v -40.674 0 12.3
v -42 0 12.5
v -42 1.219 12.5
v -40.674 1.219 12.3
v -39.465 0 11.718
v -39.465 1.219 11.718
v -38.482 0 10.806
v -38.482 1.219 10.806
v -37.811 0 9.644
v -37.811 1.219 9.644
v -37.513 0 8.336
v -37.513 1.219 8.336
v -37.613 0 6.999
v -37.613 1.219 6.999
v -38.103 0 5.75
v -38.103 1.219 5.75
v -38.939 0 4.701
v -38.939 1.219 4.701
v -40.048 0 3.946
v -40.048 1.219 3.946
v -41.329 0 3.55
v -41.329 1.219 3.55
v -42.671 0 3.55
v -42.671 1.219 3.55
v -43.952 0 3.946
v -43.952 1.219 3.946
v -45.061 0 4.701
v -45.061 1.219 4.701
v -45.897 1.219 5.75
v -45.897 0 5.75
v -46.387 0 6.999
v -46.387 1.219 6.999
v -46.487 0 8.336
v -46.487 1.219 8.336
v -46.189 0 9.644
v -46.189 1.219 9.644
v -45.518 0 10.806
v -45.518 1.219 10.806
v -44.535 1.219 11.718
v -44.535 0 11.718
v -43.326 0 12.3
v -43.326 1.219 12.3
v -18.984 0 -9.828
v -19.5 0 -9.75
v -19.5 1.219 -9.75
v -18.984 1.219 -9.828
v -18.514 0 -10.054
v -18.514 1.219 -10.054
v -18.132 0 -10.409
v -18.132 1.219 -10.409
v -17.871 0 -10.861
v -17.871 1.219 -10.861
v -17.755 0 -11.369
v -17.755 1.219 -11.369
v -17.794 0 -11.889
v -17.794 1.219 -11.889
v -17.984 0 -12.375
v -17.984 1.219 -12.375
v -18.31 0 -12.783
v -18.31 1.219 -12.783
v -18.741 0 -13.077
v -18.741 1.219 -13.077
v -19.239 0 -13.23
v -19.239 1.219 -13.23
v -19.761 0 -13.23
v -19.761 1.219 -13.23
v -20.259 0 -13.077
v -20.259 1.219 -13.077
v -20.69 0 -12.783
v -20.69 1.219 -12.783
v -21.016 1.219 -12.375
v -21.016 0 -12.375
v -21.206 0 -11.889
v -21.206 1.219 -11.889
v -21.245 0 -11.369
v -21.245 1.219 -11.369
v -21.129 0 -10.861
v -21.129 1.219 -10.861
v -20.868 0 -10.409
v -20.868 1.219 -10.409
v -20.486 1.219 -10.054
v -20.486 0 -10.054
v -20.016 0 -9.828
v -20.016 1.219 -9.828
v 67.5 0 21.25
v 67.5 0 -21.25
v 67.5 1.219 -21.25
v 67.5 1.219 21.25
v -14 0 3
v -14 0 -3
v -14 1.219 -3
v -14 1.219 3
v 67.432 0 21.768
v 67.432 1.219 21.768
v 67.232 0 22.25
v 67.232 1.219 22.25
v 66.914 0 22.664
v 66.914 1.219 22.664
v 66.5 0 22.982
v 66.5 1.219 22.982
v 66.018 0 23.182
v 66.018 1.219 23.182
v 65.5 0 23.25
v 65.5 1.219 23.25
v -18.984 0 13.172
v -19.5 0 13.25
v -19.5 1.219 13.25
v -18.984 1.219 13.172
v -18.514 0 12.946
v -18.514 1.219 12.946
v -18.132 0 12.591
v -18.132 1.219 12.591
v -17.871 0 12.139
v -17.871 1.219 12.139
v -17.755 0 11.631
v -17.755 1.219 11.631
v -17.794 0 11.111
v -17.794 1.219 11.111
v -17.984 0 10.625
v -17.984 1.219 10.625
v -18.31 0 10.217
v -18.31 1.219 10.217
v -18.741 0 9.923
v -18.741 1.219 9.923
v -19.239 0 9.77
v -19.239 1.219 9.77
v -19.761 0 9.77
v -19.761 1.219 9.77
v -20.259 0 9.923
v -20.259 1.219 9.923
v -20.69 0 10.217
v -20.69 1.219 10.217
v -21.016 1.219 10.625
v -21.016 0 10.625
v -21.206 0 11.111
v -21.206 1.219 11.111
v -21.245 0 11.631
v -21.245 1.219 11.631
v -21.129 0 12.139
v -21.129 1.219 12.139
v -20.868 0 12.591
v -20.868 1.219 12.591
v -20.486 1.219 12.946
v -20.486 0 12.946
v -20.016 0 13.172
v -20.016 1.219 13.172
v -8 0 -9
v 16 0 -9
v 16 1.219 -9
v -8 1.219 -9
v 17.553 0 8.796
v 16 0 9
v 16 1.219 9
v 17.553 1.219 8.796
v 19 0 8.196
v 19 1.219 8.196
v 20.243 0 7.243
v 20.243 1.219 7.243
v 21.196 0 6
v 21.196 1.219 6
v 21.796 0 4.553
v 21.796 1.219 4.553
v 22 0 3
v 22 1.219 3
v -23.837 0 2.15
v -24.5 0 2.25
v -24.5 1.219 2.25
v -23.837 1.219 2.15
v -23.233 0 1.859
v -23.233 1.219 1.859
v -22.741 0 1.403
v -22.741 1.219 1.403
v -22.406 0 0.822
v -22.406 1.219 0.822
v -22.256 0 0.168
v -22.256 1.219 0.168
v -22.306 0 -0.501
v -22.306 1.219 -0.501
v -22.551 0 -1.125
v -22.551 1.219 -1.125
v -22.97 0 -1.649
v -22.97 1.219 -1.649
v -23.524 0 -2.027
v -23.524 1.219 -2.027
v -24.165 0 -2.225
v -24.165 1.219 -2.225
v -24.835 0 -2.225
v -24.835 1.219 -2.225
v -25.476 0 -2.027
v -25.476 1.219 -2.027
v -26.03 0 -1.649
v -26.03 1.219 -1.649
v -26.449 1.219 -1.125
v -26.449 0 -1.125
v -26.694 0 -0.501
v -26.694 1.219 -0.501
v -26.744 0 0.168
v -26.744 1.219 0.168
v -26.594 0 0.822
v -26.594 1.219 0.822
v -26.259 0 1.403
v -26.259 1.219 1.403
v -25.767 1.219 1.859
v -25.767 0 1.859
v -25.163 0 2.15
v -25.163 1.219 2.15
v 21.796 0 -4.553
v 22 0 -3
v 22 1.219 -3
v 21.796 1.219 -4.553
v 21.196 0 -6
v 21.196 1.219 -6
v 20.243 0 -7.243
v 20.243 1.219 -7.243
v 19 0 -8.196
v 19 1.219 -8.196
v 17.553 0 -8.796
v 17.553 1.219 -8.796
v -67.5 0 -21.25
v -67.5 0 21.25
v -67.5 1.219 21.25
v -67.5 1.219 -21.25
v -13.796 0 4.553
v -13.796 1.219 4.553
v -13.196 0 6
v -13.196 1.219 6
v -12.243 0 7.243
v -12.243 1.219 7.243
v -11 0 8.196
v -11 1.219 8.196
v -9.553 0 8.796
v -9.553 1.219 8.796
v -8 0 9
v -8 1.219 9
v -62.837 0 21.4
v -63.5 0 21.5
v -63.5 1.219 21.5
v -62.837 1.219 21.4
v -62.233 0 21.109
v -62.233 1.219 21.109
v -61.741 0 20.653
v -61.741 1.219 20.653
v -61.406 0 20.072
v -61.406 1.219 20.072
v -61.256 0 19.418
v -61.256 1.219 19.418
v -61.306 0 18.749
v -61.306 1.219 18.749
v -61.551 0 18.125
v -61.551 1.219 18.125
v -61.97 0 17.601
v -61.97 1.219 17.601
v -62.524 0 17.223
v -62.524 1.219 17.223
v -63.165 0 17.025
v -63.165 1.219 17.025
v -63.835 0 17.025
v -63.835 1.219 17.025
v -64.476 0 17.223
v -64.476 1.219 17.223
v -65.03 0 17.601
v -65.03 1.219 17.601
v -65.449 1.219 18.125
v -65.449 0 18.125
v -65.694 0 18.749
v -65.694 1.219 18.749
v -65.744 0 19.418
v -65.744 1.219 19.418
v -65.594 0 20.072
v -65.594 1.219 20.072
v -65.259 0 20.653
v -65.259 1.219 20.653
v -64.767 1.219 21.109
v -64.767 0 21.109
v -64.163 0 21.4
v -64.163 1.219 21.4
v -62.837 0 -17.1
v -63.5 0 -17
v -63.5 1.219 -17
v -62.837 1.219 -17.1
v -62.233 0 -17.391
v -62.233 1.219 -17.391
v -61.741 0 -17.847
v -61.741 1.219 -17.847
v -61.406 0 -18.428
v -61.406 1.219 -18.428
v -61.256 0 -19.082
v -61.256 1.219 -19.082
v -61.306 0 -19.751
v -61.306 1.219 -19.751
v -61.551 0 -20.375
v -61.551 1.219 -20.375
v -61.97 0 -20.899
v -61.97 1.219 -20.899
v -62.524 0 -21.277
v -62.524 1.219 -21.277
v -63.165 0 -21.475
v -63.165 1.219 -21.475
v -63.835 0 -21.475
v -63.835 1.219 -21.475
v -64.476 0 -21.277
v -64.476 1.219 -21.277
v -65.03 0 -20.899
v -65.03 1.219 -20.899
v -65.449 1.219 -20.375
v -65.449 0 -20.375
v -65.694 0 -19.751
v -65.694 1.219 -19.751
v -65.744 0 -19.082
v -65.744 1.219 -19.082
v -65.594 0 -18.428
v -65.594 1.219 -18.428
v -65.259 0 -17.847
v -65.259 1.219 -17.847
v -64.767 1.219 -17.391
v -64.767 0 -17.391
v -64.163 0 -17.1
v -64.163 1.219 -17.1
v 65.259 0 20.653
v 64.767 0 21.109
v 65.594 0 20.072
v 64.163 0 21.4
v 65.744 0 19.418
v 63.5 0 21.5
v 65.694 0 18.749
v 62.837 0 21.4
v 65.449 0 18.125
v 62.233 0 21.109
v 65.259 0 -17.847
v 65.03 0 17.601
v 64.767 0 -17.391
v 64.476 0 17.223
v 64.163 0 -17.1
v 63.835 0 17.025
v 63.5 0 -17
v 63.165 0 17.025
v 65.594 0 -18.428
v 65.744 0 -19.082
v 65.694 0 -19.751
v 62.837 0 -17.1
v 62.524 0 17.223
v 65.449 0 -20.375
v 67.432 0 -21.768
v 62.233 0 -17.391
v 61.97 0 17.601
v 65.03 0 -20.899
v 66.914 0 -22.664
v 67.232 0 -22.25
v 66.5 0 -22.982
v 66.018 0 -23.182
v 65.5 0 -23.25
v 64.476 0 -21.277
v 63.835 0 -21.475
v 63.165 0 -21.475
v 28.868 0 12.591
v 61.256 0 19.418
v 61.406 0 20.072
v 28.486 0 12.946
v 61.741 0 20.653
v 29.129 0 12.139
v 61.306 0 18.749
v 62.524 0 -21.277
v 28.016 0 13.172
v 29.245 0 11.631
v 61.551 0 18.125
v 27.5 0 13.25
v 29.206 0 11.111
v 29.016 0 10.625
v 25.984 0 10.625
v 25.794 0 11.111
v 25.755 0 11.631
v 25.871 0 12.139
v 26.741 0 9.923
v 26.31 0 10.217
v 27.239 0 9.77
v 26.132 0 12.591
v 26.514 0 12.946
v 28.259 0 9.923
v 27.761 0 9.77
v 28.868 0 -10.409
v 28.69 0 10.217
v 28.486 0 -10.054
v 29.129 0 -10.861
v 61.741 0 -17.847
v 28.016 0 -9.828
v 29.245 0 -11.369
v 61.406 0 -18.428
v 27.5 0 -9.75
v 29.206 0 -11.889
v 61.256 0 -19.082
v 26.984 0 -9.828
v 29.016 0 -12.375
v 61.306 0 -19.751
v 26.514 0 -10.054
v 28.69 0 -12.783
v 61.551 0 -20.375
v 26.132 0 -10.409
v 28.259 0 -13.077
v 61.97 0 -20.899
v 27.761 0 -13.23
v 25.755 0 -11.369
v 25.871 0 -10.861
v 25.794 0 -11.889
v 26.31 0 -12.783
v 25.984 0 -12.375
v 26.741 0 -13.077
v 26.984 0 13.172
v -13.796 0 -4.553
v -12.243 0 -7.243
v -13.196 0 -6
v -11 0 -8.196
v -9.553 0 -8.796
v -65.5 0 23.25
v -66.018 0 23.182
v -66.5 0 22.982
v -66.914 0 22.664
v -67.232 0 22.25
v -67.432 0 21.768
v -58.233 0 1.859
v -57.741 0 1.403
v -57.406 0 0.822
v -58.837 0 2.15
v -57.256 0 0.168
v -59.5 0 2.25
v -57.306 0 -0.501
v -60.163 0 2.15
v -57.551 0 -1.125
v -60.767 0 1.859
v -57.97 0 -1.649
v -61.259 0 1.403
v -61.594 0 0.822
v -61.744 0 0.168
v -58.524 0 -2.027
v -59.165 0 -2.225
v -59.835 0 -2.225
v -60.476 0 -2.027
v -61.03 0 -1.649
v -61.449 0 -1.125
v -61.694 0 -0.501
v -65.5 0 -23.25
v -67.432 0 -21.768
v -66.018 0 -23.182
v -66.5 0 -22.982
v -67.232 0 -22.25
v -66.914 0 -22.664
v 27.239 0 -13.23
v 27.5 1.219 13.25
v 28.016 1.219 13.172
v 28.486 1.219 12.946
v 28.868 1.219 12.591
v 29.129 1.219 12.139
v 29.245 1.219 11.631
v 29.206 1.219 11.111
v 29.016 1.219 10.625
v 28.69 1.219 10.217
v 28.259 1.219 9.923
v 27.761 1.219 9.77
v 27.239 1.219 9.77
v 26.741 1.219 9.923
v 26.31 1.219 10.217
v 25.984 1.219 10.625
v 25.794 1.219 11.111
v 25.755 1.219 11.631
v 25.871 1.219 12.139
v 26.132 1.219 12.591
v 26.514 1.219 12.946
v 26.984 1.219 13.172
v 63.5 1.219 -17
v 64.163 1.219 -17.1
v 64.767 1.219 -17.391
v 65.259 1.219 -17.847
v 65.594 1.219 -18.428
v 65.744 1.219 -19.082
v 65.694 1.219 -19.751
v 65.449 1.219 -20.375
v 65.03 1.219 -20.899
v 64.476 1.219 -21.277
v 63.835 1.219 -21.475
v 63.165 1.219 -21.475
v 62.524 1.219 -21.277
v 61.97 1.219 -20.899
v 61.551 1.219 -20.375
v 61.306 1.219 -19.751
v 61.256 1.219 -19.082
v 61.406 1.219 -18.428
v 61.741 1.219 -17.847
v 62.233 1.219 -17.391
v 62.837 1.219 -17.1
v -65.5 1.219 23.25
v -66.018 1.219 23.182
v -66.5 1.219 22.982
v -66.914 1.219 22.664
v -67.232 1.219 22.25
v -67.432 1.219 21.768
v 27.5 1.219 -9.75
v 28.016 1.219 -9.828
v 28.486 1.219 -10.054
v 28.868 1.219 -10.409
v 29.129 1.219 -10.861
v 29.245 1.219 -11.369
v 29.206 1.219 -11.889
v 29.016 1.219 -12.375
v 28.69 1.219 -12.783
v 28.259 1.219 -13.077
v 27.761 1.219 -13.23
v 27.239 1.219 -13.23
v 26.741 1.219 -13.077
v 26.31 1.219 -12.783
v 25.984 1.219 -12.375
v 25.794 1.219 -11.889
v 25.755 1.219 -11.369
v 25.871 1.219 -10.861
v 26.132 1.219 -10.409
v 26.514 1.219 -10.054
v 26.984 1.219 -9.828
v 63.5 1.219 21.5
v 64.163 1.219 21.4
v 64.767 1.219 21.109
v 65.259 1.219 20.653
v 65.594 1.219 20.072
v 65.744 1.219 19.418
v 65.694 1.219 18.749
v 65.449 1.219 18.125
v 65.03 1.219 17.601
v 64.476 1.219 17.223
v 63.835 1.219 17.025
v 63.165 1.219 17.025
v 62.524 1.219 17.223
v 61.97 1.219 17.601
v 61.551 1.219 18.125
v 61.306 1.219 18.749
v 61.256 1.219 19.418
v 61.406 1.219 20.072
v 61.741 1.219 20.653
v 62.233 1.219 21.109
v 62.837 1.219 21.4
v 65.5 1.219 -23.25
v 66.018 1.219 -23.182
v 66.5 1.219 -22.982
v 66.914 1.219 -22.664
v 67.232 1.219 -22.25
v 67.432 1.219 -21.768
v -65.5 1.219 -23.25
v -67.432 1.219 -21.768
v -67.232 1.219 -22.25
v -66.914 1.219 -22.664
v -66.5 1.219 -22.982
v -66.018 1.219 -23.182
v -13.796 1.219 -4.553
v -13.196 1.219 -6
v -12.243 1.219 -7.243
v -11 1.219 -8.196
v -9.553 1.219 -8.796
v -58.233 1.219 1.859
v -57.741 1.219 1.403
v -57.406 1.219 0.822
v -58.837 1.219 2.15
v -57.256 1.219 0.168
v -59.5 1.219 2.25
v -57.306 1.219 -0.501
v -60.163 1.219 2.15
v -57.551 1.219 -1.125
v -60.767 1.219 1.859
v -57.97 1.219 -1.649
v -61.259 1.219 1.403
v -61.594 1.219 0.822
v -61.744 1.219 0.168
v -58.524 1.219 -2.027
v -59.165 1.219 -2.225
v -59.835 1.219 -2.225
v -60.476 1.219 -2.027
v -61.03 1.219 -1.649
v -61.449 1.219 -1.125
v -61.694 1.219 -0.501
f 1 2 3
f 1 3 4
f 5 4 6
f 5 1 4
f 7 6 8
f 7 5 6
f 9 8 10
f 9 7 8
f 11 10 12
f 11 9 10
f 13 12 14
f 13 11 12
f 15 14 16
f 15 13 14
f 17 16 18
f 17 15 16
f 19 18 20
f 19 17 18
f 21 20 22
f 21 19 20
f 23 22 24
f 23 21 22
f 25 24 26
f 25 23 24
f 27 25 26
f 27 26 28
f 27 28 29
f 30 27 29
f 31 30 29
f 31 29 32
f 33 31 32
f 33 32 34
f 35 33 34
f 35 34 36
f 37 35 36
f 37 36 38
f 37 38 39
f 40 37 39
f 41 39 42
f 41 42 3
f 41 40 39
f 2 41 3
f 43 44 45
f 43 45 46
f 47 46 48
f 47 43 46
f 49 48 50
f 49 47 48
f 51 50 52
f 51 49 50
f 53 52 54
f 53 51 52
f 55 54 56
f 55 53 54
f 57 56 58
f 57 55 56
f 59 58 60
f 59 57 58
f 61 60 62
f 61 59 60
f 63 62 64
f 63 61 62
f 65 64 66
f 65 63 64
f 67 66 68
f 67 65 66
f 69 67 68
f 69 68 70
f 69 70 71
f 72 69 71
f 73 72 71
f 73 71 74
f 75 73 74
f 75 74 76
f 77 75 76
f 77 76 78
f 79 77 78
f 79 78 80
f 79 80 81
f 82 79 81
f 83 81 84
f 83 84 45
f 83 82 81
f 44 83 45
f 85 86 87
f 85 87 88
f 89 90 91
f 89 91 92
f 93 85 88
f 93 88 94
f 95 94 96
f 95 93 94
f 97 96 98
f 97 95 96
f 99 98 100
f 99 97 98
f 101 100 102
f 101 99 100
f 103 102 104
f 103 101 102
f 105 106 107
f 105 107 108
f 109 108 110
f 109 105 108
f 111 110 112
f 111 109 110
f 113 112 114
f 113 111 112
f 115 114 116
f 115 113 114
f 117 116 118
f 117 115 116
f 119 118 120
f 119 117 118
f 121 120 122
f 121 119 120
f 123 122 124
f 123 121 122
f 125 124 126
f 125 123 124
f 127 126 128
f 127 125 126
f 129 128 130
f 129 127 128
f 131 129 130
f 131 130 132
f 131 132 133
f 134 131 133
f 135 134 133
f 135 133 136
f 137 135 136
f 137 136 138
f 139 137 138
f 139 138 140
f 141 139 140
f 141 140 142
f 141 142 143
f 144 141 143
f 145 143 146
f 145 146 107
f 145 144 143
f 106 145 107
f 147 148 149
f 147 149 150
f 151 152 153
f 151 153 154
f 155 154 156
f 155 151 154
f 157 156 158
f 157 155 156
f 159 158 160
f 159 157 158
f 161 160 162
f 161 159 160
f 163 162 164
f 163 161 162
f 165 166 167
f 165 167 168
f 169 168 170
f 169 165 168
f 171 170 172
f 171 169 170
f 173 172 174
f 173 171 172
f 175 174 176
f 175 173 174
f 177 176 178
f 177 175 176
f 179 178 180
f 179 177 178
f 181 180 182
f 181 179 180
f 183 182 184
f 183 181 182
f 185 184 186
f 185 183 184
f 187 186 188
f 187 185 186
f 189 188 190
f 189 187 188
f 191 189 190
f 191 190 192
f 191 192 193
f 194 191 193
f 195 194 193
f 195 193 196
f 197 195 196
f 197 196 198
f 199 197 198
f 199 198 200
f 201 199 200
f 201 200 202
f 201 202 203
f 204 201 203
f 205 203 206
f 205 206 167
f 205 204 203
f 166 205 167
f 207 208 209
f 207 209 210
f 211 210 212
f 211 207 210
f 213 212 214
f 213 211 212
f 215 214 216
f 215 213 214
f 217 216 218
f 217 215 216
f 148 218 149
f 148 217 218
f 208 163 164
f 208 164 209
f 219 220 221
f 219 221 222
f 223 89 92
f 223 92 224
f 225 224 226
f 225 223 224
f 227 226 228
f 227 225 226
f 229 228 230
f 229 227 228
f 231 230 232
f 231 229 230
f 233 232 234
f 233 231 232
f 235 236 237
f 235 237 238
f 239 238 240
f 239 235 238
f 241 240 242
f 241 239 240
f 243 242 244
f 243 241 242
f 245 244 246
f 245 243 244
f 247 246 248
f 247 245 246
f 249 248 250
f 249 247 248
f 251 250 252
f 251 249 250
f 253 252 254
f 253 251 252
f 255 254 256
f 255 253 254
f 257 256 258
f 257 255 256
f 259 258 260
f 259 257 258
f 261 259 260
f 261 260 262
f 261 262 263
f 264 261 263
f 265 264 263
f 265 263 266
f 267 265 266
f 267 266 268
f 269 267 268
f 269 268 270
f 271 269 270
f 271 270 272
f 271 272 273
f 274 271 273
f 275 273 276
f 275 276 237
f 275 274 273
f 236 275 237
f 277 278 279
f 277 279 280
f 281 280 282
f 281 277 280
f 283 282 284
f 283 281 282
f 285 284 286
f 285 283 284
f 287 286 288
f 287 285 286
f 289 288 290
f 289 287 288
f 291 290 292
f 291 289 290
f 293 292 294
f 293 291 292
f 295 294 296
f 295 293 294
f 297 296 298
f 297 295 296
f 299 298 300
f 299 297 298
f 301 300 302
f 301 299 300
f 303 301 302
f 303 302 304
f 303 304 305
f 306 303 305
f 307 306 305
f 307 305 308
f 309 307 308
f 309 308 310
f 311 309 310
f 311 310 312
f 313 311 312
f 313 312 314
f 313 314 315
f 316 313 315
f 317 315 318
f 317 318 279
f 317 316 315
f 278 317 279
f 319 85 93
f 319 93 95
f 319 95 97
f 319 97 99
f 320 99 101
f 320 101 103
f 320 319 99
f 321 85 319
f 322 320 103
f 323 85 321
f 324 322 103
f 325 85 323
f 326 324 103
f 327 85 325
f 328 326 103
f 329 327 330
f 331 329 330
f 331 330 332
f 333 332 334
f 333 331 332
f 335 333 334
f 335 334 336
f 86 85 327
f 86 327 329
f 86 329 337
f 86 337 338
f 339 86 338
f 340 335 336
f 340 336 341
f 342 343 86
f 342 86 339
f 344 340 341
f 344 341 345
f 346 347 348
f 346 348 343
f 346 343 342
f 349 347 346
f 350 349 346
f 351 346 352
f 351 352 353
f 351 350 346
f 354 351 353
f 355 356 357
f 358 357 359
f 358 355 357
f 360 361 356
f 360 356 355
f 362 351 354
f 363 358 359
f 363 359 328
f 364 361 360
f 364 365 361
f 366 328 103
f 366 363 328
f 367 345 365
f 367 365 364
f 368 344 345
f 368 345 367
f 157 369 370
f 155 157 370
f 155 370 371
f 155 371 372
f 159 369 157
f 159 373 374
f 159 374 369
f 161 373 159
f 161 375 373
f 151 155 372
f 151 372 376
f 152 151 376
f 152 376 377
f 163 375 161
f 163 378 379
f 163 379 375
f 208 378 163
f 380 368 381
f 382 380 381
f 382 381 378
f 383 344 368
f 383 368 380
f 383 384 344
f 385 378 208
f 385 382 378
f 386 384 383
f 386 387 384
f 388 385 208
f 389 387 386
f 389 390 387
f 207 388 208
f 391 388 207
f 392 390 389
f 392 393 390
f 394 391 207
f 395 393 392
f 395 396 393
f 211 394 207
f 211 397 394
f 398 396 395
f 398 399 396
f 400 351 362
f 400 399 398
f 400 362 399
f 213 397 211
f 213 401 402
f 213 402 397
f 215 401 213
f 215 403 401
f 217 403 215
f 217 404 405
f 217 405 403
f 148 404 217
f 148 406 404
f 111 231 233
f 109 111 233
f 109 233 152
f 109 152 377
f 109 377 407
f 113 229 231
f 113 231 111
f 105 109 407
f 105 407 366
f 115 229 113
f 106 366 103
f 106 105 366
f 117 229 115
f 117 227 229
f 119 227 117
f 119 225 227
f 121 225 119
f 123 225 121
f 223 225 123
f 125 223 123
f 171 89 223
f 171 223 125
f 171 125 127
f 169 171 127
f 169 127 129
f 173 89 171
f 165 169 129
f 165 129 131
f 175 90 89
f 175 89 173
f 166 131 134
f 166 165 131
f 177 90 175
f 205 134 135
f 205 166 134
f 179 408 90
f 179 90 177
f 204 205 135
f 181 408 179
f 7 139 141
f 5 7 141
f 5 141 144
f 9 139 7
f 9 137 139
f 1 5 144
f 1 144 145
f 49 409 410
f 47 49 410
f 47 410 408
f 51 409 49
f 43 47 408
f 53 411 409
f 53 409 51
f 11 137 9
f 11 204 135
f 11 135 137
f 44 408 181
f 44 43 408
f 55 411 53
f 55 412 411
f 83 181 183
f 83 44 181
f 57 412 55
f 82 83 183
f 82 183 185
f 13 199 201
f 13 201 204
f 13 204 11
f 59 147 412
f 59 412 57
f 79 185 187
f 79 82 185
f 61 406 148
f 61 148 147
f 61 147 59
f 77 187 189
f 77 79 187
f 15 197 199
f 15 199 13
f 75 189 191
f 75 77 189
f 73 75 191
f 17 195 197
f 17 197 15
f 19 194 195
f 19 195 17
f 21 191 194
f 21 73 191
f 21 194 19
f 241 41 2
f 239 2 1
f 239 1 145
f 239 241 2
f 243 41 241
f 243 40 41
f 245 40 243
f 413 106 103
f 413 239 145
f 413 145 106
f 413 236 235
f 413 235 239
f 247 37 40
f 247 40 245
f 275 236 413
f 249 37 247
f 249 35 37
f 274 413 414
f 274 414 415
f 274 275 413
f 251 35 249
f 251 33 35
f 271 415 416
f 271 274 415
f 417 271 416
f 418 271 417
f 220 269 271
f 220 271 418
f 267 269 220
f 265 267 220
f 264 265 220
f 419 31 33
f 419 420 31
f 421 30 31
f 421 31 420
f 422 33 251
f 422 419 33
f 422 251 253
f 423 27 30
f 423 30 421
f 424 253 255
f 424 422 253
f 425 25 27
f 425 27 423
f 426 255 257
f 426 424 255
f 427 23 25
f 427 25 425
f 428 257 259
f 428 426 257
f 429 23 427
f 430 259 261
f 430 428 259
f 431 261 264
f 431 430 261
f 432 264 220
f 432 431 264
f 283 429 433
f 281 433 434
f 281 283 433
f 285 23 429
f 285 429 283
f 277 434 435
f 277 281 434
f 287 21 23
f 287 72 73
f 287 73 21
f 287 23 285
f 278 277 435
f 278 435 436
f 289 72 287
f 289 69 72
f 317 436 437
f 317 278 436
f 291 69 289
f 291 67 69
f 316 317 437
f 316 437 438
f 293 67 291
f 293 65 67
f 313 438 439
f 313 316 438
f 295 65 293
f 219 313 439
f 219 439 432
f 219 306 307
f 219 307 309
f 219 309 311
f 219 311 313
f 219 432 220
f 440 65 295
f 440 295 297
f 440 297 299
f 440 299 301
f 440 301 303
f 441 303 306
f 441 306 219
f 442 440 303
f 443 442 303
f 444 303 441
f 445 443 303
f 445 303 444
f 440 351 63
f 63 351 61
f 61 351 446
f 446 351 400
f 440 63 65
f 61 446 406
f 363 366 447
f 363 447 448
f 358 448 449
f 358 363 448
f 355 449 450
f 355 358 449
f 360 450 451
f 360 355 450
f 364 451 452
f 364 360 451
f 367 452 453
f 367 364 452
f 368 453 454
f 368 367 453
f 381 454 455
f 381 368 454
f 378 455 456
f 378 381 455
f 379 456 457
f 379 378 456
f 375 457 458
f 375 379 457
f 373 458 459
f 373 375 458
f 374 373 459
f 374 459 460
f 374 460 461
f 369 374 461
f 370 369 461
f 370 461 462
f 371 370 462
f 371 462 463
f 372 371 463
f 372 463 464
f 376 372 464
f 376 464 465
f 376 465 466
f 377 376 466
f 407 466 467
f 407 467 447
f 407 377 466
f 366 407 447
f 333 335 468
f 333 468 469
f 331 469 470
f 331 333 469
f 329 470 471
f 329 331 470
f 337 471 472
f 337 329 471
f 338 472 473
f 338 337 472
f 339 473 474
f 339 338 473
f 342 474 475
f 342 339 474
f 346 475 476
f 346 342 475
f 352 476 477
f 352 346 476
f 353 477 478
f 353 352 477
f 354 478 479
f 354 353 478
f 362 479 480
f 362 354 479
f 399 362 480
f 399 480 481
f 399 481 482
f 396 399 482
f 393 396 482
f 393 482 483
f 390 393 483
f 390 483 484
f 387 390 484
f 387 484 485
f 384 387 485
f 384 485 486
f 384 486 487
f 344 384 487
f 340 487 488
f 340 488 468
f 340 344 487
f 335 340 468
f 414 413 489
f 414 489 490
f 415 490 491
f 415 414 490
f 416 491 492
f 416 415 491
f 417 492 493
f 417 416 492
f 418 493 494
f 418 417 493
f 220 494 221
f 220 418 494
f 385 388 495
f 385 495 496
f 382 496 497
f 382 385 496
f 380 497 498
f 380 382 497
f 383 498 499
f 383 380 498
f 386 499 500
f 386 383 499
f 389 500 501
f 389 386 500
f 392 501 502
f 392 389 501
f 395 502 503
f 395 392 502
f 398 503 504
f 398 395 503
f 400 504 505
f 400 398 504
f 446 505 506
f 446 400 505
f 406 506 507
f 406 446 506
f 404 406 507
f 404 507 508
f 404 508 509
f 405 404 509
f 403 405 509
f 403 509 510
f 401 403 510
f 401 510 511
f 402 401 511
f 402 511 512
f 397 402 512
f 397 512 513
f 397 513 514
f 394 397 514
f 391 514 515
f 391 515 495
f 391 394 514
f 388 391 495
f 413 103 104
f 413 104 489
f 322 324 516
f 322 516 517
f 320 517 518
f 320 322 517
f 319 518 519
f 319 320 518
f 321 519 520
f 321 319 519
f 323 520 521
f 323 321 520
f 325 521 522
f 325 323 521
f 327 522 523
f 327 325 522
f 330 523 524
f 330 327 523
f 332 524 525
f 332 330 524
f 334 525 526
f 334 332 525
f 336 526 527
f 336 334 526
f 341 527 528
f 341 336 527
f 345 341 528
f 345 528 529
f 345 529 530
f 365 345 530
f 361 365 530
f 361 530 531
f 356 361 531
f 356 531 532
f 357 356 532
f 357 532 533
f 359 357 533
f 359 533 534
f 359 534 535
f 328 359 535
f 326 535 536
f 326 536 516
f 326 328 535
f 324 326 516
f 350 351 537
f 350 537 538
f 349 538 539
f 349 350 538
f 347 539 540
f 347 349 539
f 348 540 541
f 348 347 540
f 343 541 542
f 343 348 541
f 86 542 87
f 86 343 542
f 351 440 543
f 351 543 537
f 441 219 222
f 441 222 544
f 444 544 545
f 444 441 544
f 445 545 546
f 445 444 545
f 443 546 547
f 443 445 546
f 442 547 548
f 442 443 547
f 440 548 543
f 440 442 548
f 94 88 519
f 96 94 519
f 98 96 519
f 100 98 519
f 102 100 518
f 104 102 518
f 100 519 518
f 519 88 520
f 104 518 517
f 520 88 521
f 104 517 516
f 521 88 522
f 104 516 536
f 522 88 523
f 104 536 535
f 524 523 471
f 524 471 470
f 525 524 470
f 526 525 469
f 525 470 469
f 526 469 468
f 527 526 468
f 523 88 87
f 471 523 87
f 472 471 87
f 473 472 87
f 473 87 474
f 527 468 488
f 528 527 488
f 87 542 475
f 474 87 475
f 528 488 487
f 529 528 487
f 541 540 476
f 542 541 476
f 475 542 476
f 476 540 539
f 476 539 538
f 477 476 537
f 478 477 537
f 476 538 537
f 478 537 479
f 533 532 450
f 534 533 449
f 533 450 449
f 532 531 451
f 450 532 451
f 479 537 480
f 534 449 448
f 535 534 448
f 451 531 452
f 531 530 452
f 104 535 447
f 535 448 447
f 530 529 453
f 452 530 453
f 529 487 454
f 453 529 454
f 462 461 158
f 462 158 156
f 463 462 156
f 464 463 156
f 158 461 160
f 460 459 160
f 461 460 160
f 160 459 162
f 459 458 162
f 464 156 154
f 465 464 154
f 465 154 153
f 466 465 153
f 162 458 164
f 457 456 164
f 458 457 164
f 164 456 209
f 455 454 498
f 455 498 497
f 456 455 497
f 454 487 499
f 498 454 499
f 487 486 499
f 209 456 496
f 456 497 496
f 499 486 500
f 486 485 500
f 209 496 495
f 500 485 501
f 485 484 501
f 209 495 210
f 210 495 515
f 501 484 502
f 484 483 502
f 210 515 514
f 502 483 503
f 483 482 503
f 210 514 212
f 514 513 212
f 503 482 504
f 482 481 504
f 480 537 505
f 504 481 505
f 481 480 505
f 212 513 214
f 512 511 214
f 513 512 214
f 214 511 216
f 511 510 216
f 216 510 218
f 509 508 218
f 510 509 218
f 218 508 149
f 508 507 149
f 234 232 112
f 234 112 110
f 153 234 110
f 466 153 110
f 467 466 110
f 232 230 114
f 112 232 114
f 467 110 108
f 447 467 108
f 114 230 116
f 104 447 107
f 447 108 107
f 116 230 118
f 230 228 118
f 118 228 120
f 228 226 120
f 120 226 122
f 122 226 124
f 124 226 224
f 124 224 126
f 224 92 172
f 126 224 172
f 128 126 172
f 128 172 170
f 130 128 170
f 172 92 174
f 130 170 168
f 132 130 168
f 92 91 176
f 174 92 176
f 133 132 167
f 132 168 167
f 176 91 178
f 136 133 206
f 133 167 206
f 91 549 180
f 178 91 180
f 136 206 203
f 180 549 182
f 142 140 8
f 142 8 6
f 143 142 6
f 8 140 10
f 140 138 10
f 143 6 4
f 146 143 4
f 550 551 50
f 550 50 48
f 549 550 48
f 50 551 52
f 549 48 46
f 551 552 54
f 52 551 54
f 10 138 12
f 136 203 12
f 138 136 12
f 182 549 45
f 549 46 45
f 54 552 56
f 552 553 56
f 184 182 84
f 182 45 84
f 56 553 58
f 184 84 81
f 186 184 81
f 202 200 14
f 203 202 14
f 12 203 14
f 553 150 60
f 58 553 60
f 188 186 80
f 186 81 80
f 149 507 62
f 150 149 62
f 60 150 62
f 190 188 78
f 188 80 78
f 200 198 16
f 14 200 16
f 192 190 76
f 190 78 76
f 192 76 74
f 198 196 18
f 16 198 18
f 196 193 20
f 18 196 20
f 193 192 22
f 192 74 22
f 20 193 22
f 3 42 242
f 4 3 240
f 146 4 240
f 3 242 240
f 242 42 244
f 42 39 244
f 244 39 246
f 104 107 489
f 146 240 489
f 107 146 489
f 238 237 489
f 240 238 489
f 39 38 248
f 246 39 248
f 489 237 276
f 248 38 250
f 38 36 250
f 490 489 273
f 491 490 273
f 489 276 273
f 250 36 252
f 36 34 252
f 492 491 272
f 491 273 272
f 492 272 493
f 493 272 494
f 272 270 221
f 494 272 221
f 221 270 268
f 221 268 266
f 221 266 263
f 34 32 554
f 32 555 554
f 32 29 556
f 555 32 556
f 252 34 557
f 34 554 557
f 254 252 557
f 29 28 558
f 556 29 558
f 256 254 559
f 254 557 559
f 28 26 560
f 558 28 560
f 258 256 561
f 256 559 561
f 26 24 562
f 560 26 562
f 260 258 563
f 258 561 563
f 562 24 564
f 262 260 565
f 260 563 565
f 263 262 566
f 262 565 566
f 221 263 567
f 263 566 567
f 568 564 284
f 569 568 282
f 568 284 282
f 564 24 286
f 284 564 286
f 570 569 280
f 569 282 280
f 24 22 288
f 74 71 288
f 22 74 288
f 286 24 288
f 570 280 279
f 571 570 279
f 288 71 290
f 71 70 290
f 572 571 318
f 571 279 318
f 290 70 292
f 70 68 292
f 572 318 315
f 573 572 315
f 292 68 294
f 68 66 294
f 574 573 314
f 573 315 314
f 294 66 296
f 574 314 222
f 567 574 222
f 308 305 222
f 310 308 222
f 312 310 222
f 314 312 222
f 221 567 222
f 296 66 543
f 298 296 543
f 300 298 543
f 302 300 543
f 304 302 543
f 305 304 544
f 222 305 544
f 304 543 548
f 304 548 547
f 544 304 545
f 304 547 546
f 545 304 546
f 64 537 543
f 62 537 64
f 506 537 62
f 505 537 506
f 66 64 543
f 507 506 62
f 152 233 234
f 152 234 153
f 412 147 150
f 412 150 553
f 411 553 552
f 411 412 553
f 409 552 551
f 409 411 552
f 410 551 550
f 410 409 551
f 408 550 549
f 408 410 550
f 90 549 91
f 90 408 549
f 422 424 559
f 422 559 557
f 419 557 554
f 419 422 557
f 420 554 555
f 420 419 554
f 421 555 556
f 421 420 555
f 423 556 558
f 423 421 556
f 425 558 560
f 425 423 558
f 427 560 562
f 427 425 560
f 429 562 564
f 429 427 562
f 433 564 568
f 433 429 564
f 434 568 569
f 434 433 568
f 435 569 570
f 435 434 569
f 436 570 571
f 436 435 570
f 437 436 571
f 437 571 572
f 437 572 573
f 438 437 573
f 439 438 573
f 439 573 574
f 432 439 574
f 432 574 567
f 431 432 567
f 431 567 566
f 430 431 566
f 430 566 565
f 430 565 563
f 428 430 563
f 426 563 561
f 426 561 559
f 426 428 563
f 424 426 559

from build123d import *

# Parameters (mm, degrees)
BASE_R      = 2.25
BASE_R_2    = 1.75
BASE_R_3    = 4.5
SHEET_DEPTH = 1.2192


with BuildPart() as part:
    # BASE → SHEET (new body)
    with BuildSketch(Plane(origin=(0, 0, 0), x_dir=(1, 0, 0), z_dir=(0, 1, 0))):
        with BuildLine():
            Line((65.5, -23.25), (-65.5, -23.25))
            ThreePointArc((-65.5, -23.25), (-66.914213562, -22.664213562), (-67.5, -21.25))
            Line((-67.5, -21.25), (-67.5, 21.25))
            ThreePointArc((-67.5, 21.25), (-66.914213562, 22.664213562), (-65.5, 23.25))
            Line((-65.5, 23.25), (65.5, 23.25))
            ThreePointArc((65.5, 23.25), (66.914213562, 22.664213562), (67.5, 21.25))
            Line((67.5, 21.25), (67.5, -21.25))
            ThreePointArc((67.5, -21.25), (66.914213562, -22.664213562), (65.5, -23.25))
        make_face()
        with Locations(Location((-59.5, 0, 0), (0, 0, 270))):
            Circle(BASE_R, mode=Mode.SUBTRACT)
        with Locations(Location((-24.5, 0, 0), (0, 0, 270))):
            Circle(BASE_R, mode=Mode.SUBTRACT)
        with Locations(Location((-63.5, 19.25, 0), (0, 0, 270))):
            Circle(BASE_R, mode=Mode.SUBTRACT)
        with Locations(Location((-63.5, -19.25, 0), (0, 0, 270))):
            Circle(BASE_R, mode=Mode.SUBTRACT)
        with Locations(Location((63.5, -19.25, 0), (0, 0, 270))):
            Circle(BASE_R, mode=Mode.SUBTRACT)
        with Locations(Location((63.5, 19.25, 0), (0, 0, 270))):
            Circle(BASE_R, mode=Mode.SUBTRACT)
        with Locations(Location((-19.5, 11.5, 0), (0, 0, 270))):
            Circle(BASE_R_2, mode=Mode.SUBTRACT)
        with Locations(Location((27.5, 11.5, 0), (0, 0, 270))):
            Circle(BASE_R_2, mode=Mode.SUBTRACT)
        with Locations(Location((27.5, -11.5, 0), (0, 0, 270))):
            Circle(BASE_R_2, mode=Mode.SUBTRACT)
        with Locations(Location((-19.5, -11.5, 0), (0, 0, 270))):
            Circle(BASE_R_2, mode=Mode.SUBTRACT)
        with Locations(Location((-42, -8, 0), (0, 0, 270))):
            Circle(BASE_R_3, mode=Mode.SUBTRACT)
        with BuildLine():
            Line((-8, -9), (16, -9))
            ThreePointArc((16, -9), (20.242640687, -7.242640687), (22, -3))
            Line((22, -3), (22, 3))
            ThreePointArc((22, 3), (20.242640687, 7.242640687), (16, 9))
            Line((16, 9), (-8, 9))
            ThreePointArc((-8, 9), (-12.242640687, 7.242640687), (-14, 3))
            Line((-14, 3), (-14, -3))
            ThreePointArc((-14, -3), (-12.242640687, -7.242640687), (-8, -9))
        make_face(mode=Mode.SUBTRACT)
    extrude(amount=SHEET_DEPTH)


solid = part.part
